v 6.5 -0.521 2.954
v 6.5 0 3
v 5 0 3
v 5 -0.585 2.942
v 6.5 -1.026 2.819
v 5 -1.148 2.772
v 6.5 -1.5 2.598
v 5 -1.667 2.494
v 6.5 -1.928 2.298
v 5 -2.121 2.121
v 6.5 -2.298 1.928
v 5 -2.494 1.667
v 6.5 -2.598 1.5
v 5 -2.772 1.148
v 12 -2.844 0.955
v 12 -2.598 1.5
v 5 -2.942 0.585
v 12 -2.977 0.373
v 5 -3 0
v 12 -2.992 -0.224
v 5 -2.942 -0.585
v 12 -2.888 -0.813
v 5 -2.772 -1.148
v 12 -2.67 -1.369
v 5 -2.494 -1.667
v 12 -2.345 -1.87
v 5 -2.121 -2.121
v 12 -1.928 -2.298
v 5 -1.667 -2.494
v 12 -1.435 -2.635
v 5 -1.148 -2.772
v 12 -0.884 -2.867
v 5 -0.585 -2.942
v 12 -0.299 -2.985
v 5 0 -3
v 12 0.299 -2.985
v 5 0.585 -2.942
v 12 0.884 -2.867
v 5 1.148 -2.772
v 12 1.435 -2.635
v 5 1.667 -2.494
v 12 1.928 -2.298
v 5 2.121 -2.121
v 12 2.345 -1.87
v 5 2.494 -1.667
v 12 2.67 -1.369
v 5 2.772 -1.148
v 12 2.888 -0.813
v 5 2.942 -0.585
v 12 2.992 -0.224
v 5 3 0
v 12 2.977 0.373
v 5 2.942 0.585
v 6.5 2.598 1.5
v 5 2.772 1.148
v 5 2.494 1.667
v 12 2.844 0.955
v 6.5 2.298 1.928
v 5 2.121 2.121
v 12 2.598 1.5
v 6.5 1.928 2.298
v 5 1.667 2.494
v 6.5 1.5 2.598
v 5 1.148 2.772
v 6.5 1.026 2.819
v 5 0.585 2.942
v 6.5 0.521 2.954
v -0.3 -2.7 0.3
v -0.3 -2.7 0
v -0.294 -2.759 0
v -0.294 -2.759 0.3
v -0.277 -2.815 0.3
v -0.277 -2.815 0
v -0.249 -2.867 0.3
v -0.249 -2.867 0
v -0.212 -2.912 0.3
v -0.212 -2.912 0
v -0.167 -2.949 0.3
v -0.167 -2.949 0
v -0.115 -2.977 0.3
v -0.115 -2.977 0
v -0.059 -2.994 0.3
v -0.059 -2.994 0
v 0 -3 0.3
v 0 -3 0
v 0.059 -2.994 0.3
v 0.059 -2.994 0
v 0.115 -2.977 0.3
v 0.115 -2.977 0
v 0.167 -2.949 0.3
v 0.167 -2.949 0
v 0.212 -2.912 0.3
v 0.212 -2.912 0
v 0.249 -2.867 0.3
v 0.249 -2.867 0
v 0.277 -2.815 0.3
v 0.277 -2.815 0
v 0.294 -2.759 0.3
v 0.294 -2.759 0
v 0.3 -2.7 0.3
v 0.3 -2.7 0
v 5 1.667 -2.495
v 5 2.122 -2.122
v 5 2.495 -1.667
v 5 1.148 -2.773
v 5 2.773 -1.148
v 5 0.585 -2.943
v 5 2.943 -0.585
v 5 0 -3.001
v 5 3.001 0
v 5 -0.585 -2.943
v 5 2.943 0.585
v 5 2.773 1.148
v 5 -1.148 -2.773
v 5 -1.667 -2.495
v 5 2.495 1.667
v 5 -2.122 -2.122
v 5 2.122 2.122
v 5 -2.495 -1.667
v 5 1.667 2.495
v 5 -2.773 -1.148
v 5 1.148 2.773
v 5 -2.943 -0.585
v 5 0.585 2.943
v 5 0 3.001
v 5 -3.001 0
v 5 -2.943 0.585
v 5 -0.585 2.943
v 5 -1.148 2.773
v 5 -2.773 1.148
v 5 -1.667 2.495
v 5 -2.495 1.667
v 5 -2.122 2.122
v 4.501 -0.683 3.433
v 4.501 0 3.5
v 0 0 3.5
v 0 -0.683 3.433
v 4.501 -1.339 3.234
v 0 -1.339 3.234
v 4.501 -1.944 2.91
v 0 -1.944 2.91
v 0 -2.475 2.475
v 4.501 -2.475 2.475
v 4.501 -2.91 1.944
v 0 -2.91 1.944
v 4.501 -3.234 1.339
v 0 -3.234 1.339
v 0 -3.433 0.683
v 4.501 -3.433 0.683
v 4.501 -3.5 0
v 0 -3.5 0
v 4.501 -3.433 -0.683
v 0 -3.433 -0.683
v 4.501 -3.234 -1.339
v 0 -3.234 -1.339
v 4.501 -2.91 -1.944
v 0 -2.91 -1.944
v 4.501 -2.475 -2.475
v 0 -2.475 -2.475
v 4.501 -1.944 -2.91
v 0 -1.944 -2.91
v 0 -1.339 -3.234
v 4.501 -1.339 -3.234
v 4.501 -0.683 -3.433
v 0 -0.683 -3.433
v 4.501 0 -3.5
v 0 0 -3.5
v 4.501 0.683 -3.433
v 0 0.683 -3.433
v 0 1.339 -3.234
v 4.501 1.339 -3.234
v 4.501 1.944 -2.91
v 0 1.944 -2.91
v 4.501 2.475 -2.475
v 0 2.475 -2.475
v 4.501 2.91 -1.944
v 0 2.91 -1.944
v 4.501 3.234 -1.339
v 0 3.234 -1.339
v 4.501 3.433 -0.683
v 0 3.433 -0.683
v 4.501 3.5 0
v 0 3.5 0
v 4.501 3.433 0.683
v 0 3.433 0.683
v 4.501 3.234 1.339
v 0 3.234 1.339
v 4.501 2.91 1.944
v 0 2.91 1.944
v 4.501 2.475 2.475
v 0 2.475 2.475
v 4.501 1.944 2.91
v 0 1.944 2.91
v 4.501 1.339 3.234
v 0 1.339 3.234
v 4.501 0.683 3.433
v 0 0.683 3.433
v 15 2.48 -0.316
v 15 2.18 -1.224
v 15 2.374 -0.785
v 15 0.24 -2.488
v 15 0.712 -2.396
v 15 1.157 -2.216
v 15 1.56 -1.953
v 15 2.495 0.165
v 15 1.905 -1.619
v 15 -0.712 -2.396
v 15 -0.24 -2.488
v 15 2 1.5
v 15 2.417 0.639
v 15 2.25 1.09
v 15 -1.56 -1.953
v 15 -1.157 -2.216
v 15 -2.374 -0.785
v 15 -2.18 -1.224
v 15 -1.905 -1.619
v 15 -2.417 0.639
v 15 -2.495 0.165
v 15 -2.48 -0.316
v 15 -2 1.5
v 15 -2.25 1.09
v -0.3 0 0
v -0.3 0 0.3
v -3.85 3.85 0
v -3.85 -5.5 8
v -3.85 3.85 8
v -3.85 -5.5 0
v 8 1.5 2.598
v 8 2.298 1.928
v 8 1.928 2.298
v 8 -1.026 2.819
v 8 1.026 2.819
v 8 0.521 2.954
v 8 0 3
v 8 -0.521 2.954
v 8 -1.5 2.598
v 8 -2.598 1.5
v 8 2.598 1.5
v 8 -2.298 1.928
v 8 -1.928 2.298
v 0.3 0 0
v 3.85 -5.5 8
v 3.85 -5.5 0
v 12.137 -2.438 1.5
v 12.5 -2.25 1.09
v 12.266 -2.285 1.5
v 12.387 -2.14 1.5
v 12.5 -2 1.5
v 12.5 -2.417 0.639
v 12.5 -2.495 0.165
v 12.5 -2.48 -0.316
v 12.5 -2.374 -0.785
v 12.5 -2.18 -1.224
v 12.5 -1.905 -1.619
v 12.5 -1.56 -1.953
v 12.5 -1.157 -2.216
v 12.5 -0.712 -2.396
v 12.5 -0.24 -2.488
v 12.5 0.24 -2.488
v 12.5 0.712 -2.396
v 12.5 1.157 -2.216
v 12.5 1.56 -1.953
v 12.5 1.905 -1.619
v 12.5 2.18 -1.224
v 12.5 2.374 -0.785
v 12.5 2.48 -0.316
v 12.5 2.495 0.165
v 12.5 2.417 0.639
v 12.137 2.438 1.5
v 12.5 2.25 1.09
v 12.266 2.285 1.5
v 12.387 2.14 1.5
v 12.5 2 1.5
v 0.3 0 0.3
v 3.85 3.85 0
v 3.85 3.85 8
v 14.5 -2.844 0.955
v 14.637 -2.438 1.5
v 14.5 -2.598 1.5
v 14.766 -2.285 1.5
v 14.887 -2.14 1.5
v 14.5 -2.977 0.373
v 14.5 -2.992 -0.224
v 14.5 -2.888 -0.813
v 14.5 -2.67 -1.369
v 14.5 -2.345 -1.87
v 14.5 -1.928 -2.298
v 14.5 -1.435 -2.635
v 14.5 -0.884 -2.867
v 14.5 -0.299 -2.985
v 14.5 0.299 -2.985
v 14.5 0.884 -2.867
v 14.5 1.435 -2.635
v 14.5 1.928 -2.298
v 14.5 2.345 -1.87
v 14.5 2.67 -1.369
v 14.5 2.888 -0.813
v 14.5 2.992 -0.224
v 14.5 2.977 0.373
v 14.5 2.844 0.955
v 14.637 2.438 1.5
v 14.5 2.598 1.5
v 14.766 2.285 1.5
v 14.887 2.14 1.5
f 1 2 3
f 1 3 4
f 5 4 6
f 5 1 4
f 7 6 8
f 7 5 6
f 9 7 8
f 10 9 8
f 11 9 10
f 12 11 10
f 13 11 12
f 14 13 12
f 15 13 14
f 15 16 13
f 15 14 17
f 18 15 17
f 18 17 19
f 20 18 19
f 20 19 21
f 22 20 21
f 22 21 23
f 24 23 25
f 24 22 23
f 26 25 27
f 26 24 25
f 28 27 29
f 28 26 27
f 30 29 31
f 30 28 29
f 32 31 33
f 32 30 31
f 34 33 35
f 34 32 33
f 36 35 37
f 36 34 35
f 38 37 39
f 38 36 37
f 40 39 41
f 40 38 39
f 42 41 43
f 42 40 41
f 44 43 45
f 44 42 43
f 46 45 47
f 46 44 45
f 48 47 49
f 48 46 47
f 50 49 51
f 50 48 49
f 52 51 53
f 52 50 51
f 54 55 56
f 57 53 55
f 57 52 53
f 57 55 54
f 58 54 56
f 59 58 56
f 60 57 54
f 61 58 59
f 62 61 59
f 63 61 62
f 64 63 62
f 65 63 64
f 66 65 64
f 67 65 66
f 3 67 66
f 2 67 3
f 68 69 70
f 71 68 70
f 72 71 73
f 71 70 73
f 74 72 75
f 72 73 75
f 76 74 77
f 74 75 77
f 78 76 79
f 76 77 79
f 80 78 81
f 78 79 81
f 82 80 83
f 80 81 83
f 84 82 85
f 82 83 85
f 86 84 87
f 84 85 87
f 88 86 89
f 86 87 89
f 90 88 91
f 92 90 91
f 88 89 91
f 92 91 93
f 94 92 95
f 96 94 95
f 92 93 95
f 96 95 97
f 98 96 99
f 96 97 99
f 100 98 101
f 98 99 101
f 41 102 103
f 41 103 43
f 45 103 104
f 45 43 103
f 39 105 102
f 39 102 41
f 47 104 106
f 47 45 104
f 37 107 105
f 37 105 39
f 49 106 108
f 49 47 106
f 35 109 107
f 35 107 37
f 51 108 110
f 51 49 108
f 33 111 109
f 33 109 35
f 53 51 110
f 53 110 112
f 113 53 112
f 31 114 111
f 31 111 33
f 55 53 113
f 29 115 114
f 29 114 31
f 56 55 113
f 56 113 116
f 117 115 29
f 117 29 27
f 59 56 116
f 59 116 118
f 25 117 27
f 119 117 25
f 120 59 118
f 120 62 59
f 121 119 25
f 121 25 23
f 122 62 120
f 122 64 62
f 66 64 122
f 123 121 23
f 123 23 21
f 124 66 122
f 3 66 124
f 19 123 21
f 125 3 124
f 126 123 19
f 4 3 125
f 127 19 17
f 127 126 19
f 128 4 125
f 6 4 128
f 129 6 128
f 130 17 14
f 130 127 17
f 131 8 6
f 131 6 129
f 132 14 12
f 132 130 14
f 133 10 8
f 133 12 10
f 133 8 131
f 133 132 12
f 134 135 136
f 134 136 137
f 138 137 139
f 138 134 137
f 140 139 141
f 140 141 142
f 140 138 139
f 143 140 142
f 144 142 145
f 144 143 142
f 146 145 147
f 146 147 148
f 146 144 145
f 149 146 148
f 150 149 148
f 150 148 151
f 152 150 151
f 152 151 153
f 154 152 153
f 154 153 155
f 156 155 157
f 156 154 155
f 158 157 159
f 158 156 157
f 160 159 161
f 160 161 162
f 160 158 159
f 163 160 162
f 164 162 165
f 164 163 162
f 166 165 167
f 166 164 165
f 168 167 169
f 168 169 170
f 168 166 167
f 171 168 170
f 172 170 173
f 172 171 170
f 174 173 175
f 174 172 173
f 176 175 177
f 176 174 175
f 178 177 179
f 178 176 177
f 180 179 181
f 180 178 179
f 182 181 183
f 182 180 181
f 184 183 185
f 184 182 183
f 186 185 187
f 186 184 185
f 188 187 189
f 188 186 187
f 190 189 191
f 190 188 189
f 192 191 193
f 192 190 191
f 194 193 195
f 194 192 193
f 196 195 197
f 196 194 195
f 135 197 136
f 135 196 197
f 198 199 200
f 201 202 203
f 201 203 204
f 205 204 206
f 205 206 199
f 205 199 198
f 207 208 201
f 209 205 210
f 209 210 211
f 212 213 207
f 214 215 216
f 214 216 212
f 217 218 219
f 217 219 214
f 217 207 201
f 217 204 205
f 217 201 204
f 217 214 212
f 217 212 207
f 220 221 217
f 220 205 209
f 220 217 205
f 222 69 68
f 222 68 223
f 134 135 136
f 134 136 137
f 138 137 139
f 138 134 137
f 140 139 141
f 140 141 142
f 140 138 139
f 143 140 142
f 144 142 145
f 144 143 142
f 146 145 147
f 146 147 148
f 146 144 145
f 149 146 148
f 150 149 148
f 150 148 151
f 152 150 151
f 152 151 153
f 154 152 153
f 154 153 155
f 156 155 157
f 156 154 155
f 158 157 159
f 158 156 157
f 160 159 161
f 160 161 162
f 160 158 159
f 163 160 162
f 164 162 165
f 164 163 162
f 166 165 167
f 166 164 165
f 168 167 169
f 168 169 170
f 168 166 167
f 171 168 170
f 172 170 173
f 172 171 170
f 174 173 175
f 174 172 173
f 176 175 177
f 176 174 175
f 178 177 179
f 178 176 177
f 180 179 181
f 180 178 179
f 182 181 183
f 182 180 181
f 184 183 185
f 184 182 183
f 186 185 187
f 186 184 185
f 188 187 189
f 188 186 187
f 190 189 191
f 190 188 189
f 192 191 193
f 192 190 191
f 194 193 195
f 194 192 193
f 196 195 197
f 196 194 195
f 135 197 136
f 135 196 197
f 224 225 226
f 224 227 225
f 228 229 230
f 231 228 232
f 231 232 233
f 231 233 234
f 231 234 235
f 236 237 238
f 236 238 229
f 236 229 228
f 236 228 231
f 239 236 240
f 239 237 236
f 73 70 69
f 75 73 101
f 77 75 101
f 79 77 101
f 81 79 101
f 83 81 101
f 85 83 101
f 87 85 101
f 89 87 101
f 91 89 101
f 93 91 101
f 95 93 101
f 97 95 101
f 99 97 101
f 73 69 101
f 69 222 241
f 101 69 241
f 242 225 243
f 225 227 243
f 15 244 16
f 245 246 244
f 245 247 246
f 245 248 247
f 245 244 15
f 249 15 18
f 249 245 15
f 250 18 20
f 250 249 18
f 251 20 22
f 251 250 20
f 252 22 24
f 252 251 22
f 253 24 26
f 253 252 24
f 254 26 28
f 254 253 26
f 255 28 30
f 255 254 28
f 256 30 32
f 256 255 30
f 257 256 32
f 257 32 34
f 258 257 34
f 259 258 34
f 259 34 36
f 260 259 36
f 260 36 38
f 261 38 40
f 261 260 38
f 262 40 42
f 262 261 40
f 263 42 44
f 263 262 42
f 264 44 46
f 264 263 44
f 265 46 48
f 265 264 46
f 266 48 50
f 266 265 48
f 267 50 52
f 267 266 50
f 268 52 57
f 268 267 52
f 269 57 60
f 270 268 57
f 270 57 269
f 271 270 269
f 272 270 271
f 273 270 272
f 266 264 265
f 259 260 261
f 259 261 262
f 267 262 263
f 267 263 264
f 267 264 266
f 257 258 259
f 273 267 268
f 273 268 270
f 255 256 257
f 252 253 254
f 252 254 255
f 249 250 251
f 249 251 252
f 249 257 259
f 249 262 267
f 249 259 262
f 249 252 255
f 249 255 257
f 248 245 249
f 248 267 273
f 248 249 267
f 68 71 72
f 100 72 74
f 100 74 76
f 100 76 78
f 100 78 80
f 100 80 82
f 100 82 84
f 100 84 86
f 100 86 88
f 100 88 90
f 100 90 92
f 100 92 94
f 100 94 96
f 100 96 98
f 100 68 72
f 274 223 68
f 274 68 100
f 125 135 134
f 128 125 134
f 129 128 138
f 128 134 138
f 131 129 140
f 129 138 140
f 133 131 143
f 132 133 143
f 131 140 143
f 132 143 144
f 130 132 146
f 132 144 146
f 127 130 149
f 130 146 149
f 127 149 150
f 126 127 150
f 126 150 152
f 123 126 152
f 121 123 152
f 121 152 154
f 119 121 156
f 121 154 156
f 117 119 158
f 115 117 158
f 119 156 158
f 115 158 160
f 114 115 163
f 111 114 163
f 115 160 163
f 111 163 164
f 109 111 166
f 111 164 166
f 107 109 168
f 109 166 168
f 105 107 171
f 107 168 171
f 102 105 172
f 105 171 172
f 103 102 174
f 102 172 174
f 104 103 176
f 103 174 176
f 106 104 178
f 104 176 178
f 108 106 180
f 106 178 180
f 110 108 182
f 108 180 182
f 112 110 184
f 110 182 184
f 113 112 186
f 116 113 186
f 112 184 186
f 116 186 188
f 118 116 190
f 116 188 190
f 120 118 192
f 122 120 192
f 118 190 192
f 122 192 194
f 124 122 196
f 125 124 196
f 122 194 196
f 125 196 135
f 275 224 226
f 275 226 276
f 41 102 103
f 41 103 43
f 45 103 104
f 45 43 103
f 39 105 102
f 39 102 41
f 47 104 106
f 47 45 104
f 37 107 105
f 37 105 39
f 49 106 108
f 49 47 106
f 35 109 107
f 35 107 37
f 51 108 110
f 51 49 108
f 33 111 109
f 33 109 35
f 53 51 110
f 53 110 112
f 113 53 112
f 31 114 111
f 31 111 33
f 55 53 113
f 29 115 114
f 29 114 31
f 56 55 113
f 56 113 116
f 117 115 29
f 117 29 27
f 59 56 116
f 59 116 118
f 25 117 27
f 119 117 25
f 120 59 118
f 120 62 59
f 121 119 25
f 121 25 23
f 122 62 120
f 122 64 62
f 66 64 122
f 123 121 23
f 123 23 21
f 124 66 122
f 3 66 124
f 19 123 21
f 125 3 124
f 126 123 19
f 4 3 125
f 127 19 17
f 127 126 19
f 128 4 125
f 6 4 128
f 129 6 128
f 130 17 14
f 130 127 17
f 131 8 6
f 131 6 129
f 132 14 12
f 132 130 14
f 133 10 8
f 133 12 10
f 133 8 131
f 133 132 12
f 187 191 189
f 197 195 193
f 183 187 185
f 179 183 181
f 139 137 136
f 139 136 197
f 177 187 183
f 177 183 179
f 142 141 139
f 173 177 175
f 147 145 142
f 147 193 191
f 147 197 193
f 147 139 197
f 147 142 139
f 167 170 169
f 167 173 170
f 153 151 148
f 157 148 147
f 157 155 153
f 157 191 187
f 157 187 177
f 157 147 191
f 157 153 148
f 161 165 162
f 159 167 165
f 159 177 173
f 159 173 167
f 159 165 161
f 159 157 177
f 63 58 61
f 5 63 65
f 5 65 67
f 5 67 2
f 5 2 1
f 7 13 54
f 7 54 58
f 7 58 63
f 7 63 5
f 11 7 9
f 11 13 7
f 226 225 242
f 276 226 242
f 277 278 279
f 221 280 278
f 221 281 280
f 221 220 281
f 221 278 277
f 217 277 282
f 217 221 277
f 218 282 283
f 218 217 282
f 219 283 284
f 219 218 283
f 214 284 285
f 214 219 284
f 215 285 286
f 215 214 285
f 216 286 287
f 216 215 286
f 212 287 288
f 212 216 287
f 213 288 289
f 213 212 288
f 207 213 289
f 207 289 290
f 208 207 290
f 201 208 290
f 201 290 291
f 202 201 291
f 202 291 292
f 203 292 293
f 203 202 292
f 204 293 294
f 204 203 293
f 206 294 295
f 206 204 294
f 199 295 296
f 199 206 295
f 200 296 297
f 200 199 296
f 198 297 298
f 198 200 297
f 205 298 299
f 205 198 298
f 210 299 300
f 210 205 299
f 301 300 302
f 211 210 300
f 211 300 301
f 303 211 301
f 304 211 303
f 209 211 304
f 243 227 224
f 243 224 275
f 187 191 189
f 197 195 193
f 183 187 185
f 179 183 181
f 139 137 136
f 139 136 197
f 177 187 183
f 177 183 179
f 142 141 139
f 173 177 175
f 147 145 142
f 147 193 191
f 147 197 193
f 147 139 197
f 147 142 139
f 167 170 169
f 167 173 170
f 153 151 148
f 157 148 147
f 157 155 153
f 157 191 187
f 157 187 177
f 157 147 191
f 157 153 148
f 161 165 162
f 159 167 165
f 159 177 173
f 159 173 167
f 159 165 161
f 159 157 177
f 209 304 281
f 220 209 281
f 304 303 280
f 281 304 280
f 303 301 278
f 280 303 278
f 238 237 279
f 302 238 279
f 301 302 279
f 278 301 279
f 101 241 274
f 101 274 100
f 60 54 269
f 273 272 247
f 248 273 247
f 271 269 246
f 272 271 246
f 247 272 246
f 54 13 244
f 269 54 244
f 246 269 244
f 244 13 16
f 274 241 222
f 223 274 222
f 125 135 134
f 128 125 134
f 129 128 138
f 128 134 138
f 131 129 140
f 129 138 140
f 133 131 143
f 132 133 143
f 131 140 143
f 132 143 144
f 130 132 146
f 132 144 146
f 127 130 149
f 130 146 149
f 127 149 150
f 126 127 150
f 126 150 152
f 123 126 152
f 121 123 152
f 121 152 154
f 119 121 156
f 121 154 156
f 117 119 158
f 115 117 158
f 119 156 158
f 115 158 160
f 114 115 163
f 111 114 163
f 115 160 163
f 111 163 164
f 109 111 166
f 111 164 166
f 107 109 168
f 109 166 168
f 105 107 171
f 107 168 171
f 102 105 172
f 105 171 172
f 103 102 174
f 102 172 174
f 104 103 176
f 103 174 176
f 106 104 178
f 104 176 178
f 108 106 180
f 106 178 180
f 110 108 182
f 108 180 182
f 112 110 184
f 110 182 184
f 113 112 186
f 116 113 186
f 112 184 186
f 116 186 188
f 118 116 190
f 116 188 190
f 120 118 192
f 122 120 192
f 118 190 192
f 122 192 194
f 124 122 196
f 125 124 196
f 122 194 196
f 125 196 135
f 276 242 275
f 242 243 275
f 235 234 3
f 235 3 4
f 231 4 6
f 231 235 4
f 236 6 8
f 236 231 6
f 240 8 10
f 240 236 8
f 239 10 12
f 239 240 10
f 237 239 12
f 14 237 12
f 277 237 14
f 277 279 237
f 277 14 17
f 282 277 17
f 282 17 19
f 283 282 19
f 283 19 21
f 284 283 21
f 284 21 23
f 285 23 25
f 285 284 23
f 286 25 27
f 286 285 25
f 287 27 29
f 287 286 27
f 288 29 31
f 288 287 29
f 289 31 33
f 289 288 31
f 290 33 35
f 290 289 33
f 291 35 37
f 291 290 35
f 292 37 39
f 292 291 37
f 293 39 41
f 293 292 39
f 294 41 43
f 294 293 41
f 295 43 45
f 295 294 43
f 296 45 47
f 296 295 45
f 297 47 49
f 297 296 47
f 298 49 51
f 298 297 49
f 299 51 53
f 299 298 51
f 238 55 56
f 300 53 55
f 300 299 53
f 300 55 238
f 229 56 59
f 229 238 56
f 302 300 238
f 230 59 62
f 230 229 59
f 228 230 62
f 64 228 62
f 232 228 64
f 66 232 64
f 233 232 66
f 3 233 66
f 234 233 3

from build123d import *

# Parameters (mm, degrees)
SKETCH001_W     = 7.7
SKETCH001_H     = 9.35
PAD_DEPTH       = 1
SKETCH002_W     = 7.7
SKETCH002_H     = 9.35
PAD001_DEPTH    = 5
SKETCH003_W     = 7.7
SKETCH003_H     = 9.35
PAD002_DEPTH    = 2
SKETCH007_W     = 7
SKETCH007_H     = 1.5
POCKET_DEPTH    = 3
CHAMFER_SIZE    = 0.5
CHAMFER001_SIZE = 0.499
SKETCH009_W     = 6
SKETCH009_H     = 1.5
POCKET001_DEPTH = 3
CHAMFER002_SIZE = 0.5
CHAMFER003_SIZE = 0.499
PAD003_DEPTH    = 0.3


with BuildPart() as rd701f_body:
    # Sketch001 → Pad (new body)
    with BuildSketch(Plane.XY):
        with Locations((0, -0.825)):
            Rectangle(SKETCH001_W, SKETCH001_H)
    extrude(amount=PAD_DEPTH)

    # Sketch002 (on ShapeBinder) → Pad001 (join)
    with BuildSketch(Plane.XY.offset(1)):
        with Locations((0, -0.825)):
            Rectangle(SKETCH002_W, SKETCH002_H)
    extrude(amount=PAD001_DEPTH)

    # Sketch003 (on ShapeBinder) → Pad002 (join)
    with BuildSketch(Plane.XY.offset(6)):
        with Locations((0, -0.825)):
            Rectangle(SKETCH003_W, SKETCH003_H)
    extrude(amount=PAD002_DEPTH)


with BuildPart() as rd701f_shaft_type_15f:
    # Sketch005 → Revolution (revolve)
    with BuildSketch(Plane.XZ):
        Polygon((0, 0), (0, 3.5), (5, 3.5), (5, 3), (15, 3), (15, 0), align=None)
    revolve(axis=Axis((0, 0, 0), (1, 0, 0)))

    # Sketch007 → Pocket (cut, symmetric)
    with BuildSketch(Plane.XZ):
        with Locations((11.5, 2.25)):
            Rectangle(SKETCH007_W, SKETCH007_H)
    extrude(amount=POCKET_DEPTH, both=True, mode=Mode.SUBTRACT)

    # Chamfer
    chamfer_edges = [rd701f_shaft_type_15f.edges().sort_by_distance(p)[0] for p in [
        (15, 0, -3),
    ]]
    chamfer(chamfer_edges, length=CHAMFER_SIZE)

    # Chamfer001
    chamfer001_edges = [rd701f_shaft_type_15f.edges().sort_by_distance(p)[0] for p in [
        (5, 0, -3.5),
    ]]
    chamfer(chamfer001_edges, length=CHAMFER001_SIZE)


with BuildPart() as rd701f_shaft_type_12_5f:
    # Sketch008 → Revolution001 (revolve)
    with BuildSketch(Plane.XZ):
        Polygon((0, 0), (0, 3.5), (5, 3.5), (5, 3), (12.5, 3), (12.5, 0), align=None)
    revolve(axis=Axis((0, 0, 0), (1, 0, 0)))

    # Sketch009 → Pocket001 (cut, symmetric)
    with BuildSketch(Plane.XZ):
        with Locations((9.5, 2.25)):
            Rectangle(SKETCH009_W, SKETCH009_H)
    extrude(amount=POCKET001_DEPTH, both=True, mode=Mode.SUBTRACT)

    # Chamfer002
    chamfer002_edges = [rd701f_shaft_type_12_5f.edges().sort_by_distance(p)[0] for p in [
        (12.5, 0, -3),
    ]]
    chamfer(chamfer002_edges, length=CHAMFER002_SIZE)

    # Chamfer003
    chamfer003_edges = [rd701f_shaft_type_12_5f.edges().sort_by_distance(p)[0] for p in [
        (5, 0, -3.5),
    ]]
    chamfer(chamfer003_edges, length=CHAMFER003_SIZE)


with BuildPart() as rd701f_terminal_type_20b1:
    # Sketch011 → Pad003 (new body)
    with BuildSketch(Plane.XY):
        with BuildLine():
            ThreePointArc((-0.3, -2.7), (0, -3), (0.3, -2.7))
            Line((0.3, 0), (0.3, -2.7))
            Line((0.3, 0), (-0.3, 0))
            Line((-0.3, -2.7), (-0.3, 0))
        make_face()
    extrude(amount=PAD003_DEPTH)


solid = Compound([rd701f_body.part, rd701f_shaft_type_15f.part, rd701f_shaft_type_12_5f.part, rd701f_terminal_type_20b1.part])
